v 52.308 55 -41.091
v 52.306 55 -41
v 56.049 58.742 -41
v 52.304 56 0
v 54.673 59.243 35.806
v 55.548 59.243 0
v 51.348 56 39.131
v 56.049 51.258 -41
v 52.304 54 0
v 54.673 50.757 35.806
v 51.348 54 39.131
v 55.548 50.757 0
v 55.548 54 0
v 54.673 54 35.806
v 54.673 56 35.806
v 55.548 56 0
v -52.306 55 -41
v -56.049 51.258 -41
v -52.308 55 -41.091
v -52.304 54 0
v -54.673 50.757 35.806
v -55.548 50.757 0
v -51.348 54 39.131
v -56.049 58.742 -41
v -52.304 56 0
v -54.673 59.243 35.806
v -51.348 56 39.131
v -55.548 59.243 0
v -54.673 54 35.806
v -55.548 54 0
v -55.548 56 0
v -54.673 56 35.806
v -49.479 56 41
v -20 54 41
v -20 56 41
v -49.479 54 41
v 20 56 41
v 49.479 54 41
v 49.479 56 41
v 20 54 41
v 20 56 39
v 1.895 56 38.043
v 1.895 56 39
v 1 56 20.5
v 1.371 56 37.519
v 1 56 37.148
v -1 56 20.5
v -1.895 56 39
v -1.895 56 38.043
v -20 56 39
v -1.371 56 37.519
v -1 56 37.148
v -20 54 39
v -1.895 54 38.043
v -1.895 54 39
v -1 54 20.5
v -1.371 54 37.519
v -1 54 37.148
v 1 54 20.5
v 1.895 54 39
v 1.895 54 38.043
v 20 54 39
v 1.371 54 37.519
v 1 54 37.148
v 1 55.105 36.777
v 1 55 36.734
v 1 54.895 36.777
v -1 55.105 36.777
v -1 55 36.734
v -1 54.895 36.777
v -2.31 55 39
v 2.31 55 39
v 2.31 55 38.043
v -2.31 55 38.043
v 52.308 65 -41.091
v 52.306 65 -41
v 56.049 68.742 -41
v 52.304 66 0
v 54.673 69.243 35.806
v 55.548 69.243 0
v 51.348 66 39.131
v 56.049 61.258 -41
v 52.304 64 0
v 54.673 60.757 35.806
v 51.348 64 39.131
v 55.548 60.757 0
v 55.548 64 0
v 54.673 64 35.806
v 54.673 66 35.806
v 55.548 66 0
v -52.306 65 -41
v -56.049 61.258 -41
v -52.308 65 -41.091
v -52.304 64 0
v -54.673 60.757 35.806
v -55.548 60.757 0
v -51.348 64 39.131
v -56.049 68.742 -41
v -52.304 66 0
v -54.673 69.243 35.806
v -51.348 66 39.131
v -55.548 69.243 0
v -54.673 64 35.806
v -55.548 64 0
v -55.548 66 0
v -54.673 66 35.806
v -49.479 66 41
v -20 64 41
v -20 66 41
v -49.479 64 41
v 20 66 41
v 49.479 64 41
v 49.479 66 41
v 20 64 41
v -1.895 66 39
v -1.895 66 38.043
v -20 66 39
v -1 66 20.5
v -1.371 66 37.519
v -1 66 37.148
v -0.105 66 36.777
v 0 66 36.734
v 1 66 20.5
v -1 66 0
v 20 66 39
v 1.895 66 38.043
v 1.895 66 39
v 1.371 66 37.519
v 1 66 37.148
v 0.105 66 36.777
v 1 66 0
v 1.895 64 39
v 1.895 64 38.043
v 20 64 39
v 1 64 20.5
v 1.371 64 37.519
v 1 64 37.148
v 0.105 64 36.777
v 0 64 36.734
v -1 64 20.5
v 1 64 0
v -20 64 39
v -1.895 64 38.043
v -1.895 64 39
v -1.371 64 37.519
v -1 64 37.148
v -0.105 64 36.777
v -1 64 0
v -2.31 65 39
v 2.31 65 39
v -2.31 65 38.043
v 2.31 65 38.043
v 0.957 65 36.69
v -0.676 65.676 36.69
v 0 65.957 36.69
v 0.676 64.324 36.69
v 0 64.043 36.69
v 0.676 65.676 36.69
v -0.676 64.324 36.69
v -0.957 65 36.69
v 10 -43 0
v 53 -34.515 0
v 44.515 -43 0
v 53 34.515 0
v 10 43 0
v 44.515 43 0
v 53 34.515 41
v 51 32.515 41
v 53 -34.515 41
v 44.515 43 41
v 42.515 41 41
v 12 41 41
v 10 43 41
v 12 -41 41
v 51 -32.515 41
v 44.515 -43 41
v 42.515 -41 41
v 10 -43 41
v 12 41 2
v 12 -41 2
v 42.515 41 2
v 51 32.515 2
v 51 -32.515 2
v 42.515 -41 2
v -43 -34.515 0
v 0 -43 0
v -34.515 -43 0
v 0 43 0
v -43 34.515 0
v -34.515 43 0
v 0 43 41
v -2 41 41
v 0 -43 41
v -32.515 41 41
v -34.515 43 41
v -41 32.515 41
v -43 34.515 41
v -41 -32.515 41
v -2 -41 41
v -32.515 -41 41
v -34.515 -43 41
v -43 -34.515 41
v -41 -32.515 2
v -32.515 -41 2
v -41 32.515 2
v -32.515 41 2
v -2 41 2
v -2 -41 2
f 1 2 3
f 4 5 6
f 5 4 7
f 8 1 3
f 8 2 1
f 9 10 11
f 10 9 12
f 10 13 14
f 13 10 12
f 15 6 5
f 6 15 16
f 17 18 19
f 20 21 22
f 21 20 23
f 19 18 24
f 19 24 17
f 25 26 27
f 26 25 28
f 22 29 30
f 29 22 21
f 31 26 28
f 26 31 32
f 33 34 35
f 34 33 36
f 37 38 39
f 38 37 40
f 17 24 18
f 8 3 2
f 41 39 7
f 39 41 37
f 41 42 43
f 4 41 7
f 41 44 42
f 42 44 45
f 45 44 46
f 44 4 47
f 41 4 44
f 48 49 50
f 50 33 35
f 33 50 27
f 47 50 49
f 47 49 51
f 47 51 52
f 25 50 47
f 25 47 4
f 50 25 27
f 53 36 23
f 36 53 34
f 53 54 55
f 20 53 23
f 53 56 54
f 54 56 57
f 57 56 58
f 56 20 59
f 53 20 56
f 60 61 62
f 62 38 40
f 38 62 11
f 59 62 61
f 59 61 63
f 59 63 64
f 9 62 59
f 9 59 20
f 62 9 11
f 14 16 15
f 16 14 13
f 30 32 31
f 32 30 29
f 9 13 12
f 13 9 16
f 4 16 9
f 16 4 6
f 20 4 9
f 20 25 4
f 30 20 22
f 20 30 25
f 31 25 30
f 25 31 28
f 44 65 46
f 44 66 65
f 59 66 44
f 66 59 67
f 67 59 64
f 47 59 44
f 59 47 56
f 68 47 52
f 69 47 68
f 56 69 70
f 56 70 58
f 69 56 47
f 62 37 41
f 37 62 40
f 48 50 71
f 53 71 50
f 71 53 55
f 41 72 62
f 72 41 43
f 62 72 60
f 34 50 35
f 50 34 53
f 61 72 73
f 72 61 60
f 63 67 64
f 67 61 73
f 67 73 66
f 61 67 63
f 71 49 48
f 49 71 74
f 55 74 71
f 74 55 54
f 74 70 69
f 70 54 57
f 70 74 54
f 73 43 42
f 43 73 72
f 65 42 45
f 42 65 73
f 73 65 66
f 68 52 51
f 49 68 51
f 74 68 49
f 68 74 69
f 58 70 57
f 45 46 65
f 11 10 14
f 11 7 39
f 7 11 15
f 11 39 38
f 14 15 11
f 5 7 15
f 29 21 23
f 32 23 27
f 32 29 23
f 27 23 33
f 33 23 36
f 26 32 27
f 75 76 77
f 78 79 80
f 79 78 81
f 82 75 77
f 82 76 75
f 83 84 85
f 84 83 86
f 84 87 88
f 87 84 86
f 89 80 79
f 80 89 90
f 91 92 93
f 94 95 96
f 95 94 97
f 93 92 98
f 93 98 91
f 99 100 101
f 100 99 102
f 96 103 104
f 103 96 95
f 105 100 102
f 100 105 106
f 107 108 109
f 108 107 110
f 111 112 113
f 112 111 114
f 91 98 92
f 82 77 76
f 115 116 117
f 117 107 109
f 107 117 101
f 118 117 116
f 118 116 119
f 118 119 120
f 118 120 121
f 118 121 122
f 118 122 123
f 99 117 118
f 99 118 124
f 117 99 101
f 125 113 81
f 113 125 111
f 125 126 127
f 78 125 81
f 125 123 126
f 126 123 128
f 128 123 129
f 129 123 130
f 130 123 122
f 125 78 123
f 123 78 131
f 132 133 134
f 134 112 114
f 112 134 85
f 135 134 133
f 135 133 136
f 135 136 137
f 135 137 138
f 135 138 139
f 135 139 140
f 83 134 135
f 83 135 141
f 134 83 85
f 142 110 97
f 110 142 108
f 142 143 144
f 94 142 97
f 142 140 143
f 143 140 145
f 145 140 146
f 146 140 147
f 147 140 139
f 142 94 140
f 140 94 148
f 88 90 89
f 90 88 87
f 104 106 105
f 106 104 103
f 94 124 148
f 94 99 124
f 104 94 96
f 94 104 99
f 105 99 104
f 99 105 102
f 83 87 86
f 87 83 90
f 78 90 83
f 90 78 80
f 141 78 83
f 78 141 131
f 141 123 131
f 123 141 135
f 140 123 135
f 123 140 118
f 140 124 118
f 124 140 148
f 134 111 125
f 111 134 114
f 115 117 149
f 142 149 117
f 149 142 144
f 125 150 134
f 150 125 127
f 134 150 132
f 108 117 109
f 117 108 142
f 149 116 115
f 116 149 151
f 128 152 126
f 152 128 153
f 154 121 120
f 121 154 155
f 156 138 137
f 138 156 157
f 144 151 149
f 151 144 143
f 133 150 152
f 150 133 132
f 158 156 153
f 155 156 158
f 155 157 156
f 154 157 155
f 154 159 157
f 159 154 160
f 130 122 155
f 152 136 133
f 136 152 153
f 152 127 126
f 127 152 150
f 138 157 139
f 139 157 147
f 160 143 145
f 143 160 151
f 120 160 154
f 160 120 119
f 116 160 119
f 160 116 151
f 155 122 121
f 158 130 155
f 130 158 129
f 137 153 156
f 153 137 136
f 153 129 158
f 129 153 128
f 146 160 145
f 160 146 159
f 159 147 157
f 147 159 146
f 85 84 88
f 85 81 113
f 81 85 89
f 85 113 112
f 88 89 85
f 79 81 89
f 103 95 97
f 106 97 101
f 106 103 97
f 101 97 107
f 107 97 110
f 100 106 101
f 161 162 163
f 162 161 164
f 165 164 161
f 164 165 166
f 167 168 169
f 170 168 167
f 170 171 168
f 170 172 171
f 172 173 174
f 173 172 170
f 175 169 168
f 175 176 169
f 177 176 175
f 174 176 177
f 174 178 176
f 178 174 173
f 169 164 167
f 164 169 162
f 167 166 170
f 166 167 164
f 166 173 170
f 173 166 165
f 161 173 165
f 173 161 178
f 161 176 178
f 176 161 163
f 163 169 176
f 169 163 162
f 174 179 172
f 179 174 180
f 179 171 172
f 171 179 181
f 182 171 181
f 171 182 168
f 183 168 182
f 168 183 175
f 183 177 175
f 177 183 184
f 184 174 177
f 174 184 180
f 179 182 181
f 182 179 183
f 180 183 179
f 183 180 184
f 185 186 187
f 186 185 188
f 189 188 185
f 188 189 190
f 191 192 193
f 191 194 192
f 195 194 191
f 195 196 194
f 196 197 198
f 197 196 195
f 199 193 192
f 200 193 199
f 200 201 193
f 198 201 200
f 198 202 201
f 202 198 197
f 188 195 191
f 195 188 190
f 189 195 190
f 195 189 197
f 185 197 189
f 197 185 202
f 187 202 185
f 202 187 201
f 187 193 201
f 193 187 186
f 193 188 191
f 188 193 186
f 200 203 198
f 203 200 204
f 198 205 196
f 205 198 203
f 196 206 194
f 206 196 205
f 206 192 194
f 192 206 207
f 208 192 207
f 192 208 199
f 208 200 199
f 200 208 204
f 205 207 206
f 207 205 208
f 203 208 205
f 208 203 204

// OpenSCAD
// file: regular-square-bin.scad
// The length of the individual bin/tray.
$length = 86;

// The depth (width really) of the bin/tray.
$depth = 86;

// The height as a percentage of the total available depth of the bin it will be inserted into.
$heightPct = 50; // [20:100]

// The thickness of the outter walls.
$wallThickness = 2; // [2:10]

// The thickness of the bottom.
$bottomThickness = 2; // [2:10]

// The chamfer size on the left side of the box.
$leftChamfer = 12; // [0:14]

// The chamfer size on the right side of the box.
$rightChamfer = 12; // [0:14]

{} // Below this are not customizable parameters

generateTrayPct($length, $depth, $heightPct, $wallThickness, $bottomThickness, $leftChamfer, $rightChamfer);

module generateTrayPct(length, depth, heightPct, wallThickness, bottomThickness, leftChamfer, rightChamfer) {
    $height = 82 * heightPct * 0.01;
    generateTray(length, depth, $height, wallThickness, bottomThickness, leftChamfer, rightChamfer);
}

module generateTray(length, depth, height, wallThickness, bottomThickness, leftChamfer, rightChamfer) {
    $leftChamferTriangleSide = sqrt(pow(leftChamfer,2)/2);
    $rightChamferTriangleSide = sqrt(pow(rightChamfer,2)/2);

    // Outer polygon
    outer_points = [
        [$leftChamferTriangleSide,0], 
        [length-$rightChamferTriangleSide,0], 
        [length, $rightChamferTriangleSide],
        [length, depth-$rightChamferTriangleSide],
        [length - $rightChamferTriangleSide, depth],
        [$leftChamferTriangleSide,depth],
        [0,depth-$leftChamferTriangleSide],
        [0, $leftChamferTriangleSide]
    ];

    // Inner polygon
    inner_points = [
        [$leftChamferTriangleSide + wallThickness, wallThickness], 
        [length - $rightChamferTriangleSide - wallThickness, wallThickness], 
        [length - wallThickness, $rightChamferTriangleSide + wallThickness],
        [length - wallThickness, depth - $rightChamferTriangleSide - wallThickness],
        [length - $rightChamferTriangleSide - wallThickness, depth - wallThickness],
        [$leftChamferTriangleSide + wallThickness, depth - wallThickness],
        [wallThickness, depth - $leftChamferTriangleSide - wallThickness],
        [wallThickness, $leftChamferTriangleSide + wallThickness]
    ];

    // Create the hollow shape and extrude it
    color("green")
    linear_extrude(height = height)
    difference() {
            polygon(points = outer_points);
            polygon(points = inner_points);
    }

    // Add a solid base
    color("red")
    linear_extrude(height = bottomThickness)
    polygon(points = outer_points);
}
// file: regular-square-divider.scad
// Length of the Divider ... Regular 4" Square, X-Style: 113mm was a tad loose, 114mm was too tight, 113.5 fits but is a tad tight.
$lengthAtTop = 113.25;

// Thickness of the Divider
$thickness = 2; // [2:10]

// The proportion of the total height to use for scaling.
$heightPercentage = 100; // [10:100]

// Width of the Divider Edge
$widthOfDividerEdge = 6; // [6:10]

// The Length of the Chamfer
$chamferLength = 10; // [6:14]

// Cutout Location for connecting dividers together
$cutOutLocation = 1; // [1:Bottom, -1:Top, 0:None]

// Width of the notch at the bottom of the divider
$bottomNotchWidth = 40; // [25:50]
    
{} // All Parameters Above

// Object Generation
/////////////////////////////////////////////////
GenerateDivider($lengthAtTop, $thickness, $heightPercentage, $widthOfDividerEdge, $chamferLength, $cutOutLocation, $bottomNotchWidth);

// Generate the Divider
/////////////////////////////////////////////////
module GenerateDivider(lengthAtTop, thickness, heightPercentage, widthOfDividerEdge, chamferLength, cutOutLocation, bottomNotchWidth) {

    // THe Height of the Divider
    $height = 82;

    // The height (or depth) of the notch at the bottom of the divider
    $bottomNotchHeight = 2; // [0:10]

    // Angle of the Container Sides
    $complementAngle = 1.4;
    $angle = 90 - $complementAngle;

    difference() {
        IsoTrapezoid(lengthAtTop, $height, $angle, thickness, widthOfDividerEdge);
        
        $heightProportion = heightPercentage * .01;
        
        $precentageToRemove = (1 - $heightProportion);
        
        // Cut from the Top Down
        $amountToRemoveFromTop = $height * $precentageToRemove;
        $topEdgeFromCenter = -$height / 2;
        translate([0, 0, $topEdgeFromCenter + $amountToRemoveFromTop / 2]) cube([lengthAtTop, widthOfDividerEdge * 2, $amountToRemoveFromTop], center = true);
        
        // Cutouts For Divider
        if (cutOutLocation != 0) {
            $cutOutHeight = ($height * $heightProportion) / 2;

            $bottomOfDividerFromCenter =  $height / 2;

            $zOffSetForCutout = ($bottomOfDividerFromCenter - ($cutOutHeight / 2));
            
            if(cutOutLocation == -1){
                translate([0,0, $zOffSetForCutout - $cutOutHeight])
                #cube([thickness, thickness*1.1, $cutOutHeight], center = true);
            }
            else{
                translate([0,0, $zOffSetForCutout])
                #cube([thickness, thickness*1.1, $cutOutHeight], center = true);
            }
        }
        
        // Cutouts For Divider
        //if (cutOutLocation == -1) {
         //   $cutOutHeight = ($height * $heightProportion) / 2;

         //   $bottomOfDividerFromCenter =  $height / 2;

          //  $zOffSetForCutout = ($bottomOfDividerFromCenter - ($cutOutHeight / 2));

          //  #translate([0,0, $zOffSetForCutout - $cutOutHeight])
          //      cube([thickness, thickness*1.1, $cutOutHeight], center = true);
        //}
        

        
        // Notch at bottom
        translate([0,0,(($height)/2)-($bottomNotchHeight/2)])
            cube([bottomNotchWidth, thickness*1.1, $bottomNotchHeight], center = true);
        
        // Notch for the small sphere often in the bottom of the containers
        translate([0,0,($height/2)-$bottomNotchHeight])
            sphere(d = 5);

        // Cutoffs needed for the Chamfers in the corners
        $overcutFactor = 2;
        $zHeightOfChamfer = ($height/2);
        translate([(lengthAtTop / 2), 0,$zHeightOfChamfer])
            rotate([45,0,90])
            cube([widthOfDividerEdge * $overcutFactor,  chamferLength,  chamferLength], center = true);
        
        
        translate([-(lengthAtTop / 2), 0,$zHeightOfChamfer])
            rotate([45,0,90])
            cube([widthOfDividerEdge * $overcutFactor,  chamferLength,  chamferLength], center = true);
    }
}

// Generate an Trapezoid with a tapered angle
/////////////////////////////////////////////////
module IsoTrapezoid(longEdge, height, angle, thickness, widthOfDividerEdge){
    $baseOfTriangle = height / tan(angle);
    
    cube([longEdge - ($baseOfTriangle * 2), thickness, height], center = true);

    // Render the triangle with specified angle and height
    color("red")
        translate([(longEdge/2),-thickness/2,-(height/2)])
        rotate([90,0,180])
        triangle(angle, height, thickness);

    color("blue")
        translate([-(longEdge/2),thickness/2,-(height/2)])
        rotate([90,0,0])
        triangle(angle, height, thickness);

    $halfChamferOffSet = ($height / tan($angle))/2;
    
    translate([(longEdge/2)-$halfChamferOffSet,0,0])
        rotate([$complementAngle, 0, -90])
        triangle2(widthOfDividerEdge, height);

    translate([-(longEdge/2)+$halfChamferOffSet,0,0])
        rotate([$complementAngle, 0, 90])
        triangle2(widthOfDividerEdge, height);
}

// Create the triangle module with angle and height as arguments
/////////////////////////////////////////////////
module triangle(angle, height, thickness) {
    // Calculate the base length based on the angle and height
    base_length = height / tan(angle);

    linear_extrude(thickness)
    // Create the triangle
    polygon(points=[
        [0, 0], // First vertex
        [base_length, 0], // Second vertex
        [base_length, height] // Third vertex
    ]);
}

// Create a right triangle
/////////////////////////////////////////////////
module triangle2(sizeOfBase,length){
    difference(){   
        rotate([0,0,45]){
            cube([sizeOfBase,sizeOfBase,length], center = true);
        }
        
        translate([0,sizeOfBase/2,0]){
            cube([sizeOfBase*1.5,sizeOfBase,length*1.1], center = true);
        }
    }
}
// main file
use <regular-square-divider.scad>
use <regular-square-bin.scad>

// The length of the individual bin/tray.
$binLength = 86;

// The depth (width really) of the bin/tray.
$binDepth = 86;

// The height as a percentage of the total available depth of the bin it will be inserted into.
$binHeightPct = 50; // [20:100]

// The thickness of the outter walls.
$binWallThickness = 2; // [2:10]

// The thickness of the bottom.
$binBottomThickness = 2; // [2:10]

// The chamfer size on the left side of the box.
$binLeftChamfer = 12; // [0:14]

// The chamfer size on the right side of the box.
$binRightChamfer = 12; // [0:14]

// Length of the Divider ... Regular 4" Square, X-Style: 113mm was a tad loose, 114mm was too tight, 113.5 fits but is a tad tight.
$dividerLengthAtTop = 113.1;

// Thickness of the Divider
$dividerThickness = 2; // [2:10]

// The proportion of the total height to use for scaling.
$dividerHeightPercentage = 50; // [10:100]

// Width of the Divider Edge
$dividerWidthOfDividerEdge = 6; // [6:10]

// The Length of the Chamfer
$chamferLength = 10; // [6:14]

{} // Below this are not customizable parameters

// Divider 1
translate([0, $binLength/2 + $dividerWidthOfDividerEdge * 2, 0])
GenerateDivider($dividerLengthAtTop, $dividerThickness, $dividerHeightPercentage, $dividerWidthOfDividerEdge, $chamferLength, 1, 40);

// Divider 2
translate([0, $binLength/2 + $dividerWidthOfDividerEdge * 2 + 10, 0])
GenerateDivider($dividerLengthAtTop, $dividerThickness, $dividerHeightPercentage, $dividerWidthOfDividerEdge, $chamferLength, -1, 40);

translate([10,-$binLength/2,0])
generateTrayPct($binLength/2, $binDepth, $binHeightPct, $binWallThickness, $binBottomThickness, 0, $binRightChamfer);

translate([-$binLength/2,-$binLength/2,0])
generateTrayPct($binLength/2, $binDepth, $binHeightPct, $binWallThickness, $binBottomThickness, $binLeftChamfer, 0);
